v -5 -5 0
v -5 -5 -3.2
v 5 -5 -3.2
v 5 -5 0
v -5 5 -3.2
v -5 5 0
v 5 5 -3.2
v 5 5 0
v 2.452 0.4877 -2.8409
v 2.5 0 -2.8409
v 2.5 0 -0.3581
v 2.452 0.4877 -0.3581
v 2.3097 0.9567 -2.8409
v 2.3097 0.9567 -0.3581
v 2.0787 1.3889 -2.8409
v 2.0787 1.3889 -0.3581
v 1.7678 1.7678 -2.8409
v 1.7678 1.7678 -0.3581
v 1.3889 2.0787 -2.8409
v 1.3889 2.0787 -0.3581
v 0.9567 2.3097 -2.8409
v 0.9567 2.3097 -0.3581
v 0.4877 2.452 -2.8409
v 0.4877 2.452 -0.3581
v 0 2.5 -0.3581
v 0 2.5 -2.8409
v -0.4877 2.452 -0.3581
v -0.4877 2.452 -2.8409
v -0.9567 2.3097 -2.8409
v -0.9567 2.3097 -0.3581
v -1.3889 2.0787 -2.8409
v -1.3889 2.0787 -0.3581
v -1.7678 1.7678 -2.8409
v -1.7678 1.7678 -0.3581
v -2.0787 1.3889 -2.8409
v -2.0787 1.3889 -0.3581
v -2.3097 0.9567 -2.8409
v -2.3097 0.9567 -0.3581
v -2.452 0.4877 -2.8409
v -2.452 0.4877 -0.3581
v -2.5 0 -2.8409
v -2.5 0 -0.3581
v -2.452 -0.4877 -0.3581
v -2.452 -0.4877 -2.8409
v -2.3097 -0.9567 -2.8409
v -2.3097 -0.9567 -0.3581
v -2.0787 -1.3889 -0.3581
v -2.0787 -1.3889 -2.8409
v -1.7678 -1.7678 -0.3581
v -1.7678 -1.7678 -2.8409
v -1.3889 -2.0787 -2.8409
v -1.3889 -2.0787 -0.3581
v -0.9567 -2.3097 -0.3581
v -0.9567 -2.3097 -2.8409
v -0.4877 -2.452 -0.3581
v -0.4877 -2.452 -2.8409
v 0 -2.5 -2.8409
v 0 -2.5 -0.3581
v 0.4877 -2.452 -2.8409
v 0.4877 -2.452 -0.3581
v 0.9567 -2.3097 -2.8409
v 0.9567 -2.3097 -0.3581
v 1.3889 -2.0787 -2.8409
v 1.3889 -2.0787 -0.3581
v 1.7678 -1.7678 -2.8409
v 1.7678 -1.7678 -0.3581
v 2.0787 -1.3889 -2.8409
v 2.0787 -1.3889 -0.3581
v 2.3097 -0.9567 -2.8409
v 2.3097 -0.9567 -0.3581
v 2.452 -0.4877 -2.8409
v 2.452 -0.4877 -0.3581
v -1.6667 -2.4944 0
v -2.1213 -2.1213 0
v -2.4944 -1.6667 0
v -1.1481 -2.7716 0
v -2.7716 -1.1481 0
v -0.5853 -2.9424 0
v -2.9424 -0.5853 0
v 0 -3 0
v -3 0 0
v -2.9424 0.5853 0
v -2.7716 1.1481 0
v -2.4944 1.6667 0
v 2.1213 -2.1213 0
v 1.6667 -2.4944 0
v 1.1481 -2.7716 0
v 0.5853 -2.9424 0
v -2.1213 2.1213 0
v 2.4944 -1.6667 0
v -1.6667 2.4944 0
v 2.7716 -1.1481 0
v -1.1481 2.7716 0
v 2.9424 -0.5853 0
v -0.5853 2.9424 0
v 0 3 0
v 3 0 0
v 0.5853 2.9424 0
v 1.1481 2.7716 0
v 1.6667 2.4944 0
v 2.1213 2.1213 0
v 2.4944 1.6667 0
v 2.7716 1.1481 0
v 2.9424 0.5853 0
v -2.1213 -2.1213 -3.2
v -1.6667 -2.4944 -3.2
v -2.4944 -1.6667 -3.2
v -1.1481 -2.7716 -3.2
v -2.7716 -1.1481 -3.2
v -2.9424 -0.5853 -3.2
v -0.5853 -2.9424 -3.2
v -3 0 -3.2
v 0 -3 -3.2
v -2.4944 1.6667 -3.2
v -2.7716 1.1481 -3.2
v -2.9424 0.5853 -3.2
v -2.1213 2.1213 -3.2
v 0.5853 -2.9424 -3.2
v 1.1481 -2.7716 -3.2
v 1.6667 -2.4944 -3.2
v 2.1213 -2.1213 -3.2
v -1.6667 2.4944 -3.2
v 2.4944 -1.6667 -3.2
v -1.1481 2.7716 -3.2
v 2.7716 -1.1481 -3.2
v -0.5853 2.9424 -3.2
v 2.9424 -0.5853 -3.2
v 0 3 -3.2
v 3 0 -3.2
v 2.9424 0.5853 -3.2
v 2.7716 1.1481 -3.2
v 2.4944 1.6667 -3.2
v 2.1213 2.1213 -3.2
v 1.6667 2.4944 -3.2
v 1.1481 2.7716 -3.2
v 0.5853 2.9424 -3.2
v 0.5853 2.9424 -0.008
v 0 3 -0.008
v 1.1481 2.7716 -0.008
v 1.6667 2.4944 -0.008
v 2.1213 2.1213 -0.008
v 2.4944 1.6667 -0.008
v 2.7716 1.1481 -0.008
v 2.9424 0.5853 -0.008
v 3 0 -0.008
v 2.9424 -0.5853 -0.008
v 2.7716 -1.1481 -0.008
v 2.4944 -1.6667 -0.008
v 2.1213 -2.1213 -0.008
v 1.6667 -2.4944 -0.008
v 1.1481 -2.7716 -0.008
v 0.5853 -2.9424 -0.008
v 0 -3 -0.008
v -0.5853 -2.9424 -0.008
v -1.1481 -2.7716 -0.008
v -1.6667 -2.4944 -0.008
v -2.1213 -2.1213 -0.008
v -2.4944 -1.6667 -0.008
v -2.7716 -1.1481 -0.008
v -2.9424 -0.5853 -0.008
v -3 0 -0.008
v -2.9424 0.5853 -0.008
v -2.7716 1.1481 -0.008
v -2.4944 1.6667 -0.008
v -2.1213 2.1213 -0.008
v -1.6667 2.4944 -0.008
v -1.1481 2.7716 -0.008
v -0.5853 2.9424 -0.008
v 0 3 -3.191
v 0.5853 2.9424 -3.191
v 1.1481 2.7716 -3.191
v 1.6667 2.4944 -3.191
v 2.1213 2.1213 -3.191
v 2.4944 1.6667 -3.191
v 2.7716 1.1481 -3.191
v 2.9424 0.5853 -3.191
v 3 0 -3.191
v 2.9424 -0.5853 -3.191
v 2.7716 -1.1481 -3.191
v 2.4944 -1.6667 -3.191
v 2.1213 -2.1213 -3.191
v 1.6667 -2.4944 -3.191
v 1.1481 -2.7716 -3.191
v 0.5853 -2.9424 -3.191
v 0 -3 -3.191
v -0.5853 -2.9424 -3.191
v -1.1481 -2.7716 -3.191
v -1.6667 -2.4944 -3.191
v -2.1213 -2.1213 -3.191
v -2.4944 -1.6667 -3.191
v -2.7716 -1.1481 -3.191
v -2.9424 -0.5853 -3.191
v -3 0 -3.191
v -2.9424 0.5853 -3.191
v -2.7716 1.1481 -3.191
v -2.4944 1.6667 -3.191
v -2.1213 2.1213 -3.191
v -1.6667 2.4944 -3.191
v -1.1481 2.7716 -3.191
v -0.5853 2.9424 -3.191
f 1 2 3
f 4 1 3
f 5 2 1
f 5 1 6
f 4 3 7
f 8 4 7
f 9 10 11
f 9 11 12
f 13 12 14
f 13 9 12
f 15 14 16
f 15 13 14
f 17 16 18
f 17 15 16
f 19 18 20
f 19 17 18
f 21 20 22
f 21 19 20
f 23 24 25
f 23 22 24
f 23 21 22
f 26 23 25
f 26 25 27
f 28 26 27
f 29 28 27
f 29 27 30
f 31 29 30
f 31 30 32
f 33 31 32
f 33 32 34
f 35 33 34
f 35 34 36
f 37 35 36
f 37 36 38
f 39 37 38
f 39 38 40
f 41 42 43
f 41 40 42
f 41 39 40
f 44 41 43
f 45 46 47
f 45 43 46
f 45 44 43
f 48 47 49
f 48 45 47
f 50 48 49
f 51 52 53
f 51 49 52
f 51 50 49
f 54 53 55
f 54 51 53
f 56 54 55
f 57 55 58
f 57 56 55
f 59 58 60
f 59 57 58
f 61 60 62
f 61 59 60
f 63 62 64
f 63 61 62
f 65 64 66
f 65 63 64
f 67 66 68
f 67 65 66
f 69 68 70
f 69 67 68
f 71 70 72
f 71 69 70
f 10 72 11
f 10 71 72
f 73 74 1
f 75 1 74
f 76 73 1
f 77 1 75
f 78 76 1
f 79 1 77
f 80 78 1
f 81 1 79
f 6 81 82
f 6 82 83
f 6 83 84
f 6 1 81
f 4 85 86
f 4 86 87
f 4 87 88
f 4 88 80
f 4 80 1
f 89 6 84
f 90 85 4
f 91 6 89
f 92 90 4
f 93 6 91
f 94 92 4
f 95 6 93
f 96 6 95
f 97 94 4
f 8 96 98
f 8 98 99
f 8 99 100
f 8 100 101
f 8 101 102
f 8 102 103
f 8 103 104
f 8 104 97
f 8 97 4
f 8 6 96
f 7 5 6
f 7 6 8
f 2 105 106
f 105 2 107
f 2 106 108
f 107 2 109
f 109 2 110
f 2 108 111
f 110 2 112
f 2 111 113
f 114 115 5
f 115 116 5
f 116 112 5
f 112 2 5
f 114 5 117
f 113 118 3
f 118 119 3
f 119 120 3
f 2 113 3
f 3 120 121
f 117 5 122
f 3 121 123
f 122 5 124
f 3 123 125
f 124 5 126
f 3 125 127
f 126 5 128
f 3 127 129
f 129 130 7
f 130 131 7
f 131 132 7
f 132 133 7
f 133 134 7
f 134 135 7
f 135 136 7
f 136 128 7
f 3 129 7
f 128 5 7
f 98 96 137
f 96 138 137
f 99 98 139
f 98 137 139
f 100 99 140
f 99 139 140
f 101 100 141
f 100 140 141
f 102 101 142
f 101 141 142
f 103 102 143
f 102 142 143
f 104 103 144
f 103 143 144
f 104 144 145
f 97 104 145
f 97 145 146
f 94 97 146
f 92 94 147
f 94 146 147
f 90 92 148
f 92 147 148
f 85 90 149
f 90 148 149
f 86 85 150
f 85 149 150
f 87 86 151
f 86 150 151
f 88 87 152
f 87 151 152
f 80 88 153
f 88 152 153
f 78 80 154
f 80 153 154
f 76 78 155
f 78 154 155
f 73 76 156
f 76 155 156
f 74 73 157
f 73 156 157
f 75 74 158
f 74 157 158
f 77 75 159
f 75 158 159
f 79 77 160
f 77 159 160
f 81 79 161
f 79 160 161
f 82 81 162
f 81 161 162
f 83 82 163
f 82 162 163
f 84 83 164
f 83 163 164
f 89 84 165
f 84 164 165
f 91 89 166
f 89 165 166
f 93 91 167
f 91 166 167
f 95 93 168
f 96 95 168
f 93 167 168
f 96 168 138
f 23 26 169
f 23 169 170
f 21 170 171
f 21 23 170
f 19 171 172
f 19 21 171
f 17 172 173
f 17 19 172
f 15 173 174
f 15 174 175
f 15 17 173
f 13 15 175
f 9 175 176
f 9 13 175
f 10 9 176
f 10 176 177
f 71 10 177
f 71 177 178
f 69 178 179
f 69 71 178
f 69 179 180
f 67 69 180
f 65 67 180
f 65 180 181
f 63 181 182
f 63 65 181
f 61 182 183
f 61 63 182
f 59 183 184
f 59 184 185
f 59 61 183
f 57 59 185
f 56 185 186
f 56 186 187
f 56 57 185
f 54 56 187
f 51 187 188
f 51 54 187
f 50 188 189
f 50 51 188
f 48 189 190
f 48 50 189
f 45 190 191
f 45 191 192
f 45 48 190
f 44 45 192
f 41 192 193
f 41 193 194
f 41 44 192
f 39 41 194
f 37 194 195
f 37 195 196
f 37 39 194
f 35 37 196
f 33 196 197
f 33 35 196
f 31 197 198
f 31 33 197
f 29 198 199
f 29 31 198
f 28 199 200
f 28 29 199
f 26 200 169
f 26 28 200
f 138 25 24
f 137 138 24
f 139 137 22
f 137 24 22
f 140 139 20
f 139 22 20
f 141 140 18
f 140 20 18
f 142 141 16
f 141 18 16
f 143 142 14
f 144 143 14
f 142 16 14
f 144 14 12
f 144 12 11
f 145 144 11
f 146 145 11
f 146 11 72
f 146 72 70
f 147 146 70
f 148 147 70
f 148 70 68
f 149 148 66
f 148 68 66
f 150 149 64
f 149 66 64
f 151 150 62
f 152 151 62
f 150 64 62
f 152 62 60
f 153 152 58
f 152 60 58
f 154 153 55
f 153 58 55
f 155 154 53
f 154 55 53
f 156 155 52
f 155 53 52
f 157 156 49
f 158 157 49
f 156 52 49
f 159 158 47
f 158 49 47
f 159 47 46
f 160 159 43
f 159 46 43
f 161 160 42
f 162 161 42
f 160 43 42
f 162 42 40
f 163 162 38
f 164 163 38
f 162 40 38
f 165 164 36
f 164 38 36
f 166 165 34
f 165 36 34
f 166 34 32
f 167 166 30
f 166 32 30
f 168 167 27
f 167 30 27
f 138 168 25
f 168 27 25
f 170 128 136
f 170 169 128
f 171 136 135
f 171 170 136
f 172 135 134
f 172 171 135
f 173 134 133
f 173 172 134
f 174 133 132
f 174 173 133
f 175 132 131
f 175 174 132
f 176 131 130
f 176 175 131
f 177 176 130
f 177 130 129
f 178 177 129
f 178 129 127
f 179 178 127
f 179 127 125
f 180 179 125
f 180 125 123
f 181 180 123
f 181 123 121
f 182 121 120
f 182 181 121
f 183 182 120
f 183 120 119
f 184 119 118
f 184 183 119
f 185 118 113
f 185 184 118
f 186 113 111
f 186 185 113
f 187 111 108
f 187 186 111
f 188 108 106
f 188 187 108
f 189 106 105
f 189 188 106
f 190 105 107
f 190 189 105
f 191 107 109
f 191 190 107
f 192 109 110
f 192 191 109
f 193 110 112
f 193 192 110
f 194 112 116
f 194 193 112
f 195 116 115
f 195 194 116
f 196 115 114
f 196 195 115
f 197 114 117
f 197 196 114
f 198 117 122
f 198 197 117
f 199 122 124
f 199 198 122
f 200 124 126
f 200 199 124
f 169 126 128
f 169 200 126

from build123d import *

# Parameters (mm, degrees)
BASENUT_START = -3.2
BASENUTSKE_W  = 10
BASENUTSKE_H  = 10
BASENUTSKE_R  = 2.5
BASENUT_DEPTH = 3.2


with BuildPart() as part:
    # BaseNutSke → BaseNut (new body)
    with BuildSketch(Plane.XY.offset(BASENUT_START)):
        Rectangle(BASENUTSKE_W, BASENUTSKE_H)
        Circle(BASENUTSKE_R, mode=Mode.SUBTRACT)
    extrude(amount=BASENUT_DEPTH)

    # EndChamferSketch → EndChamfer (revolve, cut)
    with BuildSketch(Plane(origin=(0, 0, 0), x_dir=(0, 0, -1), z_dir=(1, 0, 0))):
        Polygon((3.191, 3), (2.805885854, 2.45), (3.201, 2.45), (3.201, 3), align=None)
        Polygon((-0.002, 3), (0.008, 3), (0.393114146, 2.45), (-0.002, 2.45), align=None)
    revolve(axis=Axis((0, 0, -25.037505729), (0, 0, -1)), mode=Mode.SUBTRACT)


solid = part.part
